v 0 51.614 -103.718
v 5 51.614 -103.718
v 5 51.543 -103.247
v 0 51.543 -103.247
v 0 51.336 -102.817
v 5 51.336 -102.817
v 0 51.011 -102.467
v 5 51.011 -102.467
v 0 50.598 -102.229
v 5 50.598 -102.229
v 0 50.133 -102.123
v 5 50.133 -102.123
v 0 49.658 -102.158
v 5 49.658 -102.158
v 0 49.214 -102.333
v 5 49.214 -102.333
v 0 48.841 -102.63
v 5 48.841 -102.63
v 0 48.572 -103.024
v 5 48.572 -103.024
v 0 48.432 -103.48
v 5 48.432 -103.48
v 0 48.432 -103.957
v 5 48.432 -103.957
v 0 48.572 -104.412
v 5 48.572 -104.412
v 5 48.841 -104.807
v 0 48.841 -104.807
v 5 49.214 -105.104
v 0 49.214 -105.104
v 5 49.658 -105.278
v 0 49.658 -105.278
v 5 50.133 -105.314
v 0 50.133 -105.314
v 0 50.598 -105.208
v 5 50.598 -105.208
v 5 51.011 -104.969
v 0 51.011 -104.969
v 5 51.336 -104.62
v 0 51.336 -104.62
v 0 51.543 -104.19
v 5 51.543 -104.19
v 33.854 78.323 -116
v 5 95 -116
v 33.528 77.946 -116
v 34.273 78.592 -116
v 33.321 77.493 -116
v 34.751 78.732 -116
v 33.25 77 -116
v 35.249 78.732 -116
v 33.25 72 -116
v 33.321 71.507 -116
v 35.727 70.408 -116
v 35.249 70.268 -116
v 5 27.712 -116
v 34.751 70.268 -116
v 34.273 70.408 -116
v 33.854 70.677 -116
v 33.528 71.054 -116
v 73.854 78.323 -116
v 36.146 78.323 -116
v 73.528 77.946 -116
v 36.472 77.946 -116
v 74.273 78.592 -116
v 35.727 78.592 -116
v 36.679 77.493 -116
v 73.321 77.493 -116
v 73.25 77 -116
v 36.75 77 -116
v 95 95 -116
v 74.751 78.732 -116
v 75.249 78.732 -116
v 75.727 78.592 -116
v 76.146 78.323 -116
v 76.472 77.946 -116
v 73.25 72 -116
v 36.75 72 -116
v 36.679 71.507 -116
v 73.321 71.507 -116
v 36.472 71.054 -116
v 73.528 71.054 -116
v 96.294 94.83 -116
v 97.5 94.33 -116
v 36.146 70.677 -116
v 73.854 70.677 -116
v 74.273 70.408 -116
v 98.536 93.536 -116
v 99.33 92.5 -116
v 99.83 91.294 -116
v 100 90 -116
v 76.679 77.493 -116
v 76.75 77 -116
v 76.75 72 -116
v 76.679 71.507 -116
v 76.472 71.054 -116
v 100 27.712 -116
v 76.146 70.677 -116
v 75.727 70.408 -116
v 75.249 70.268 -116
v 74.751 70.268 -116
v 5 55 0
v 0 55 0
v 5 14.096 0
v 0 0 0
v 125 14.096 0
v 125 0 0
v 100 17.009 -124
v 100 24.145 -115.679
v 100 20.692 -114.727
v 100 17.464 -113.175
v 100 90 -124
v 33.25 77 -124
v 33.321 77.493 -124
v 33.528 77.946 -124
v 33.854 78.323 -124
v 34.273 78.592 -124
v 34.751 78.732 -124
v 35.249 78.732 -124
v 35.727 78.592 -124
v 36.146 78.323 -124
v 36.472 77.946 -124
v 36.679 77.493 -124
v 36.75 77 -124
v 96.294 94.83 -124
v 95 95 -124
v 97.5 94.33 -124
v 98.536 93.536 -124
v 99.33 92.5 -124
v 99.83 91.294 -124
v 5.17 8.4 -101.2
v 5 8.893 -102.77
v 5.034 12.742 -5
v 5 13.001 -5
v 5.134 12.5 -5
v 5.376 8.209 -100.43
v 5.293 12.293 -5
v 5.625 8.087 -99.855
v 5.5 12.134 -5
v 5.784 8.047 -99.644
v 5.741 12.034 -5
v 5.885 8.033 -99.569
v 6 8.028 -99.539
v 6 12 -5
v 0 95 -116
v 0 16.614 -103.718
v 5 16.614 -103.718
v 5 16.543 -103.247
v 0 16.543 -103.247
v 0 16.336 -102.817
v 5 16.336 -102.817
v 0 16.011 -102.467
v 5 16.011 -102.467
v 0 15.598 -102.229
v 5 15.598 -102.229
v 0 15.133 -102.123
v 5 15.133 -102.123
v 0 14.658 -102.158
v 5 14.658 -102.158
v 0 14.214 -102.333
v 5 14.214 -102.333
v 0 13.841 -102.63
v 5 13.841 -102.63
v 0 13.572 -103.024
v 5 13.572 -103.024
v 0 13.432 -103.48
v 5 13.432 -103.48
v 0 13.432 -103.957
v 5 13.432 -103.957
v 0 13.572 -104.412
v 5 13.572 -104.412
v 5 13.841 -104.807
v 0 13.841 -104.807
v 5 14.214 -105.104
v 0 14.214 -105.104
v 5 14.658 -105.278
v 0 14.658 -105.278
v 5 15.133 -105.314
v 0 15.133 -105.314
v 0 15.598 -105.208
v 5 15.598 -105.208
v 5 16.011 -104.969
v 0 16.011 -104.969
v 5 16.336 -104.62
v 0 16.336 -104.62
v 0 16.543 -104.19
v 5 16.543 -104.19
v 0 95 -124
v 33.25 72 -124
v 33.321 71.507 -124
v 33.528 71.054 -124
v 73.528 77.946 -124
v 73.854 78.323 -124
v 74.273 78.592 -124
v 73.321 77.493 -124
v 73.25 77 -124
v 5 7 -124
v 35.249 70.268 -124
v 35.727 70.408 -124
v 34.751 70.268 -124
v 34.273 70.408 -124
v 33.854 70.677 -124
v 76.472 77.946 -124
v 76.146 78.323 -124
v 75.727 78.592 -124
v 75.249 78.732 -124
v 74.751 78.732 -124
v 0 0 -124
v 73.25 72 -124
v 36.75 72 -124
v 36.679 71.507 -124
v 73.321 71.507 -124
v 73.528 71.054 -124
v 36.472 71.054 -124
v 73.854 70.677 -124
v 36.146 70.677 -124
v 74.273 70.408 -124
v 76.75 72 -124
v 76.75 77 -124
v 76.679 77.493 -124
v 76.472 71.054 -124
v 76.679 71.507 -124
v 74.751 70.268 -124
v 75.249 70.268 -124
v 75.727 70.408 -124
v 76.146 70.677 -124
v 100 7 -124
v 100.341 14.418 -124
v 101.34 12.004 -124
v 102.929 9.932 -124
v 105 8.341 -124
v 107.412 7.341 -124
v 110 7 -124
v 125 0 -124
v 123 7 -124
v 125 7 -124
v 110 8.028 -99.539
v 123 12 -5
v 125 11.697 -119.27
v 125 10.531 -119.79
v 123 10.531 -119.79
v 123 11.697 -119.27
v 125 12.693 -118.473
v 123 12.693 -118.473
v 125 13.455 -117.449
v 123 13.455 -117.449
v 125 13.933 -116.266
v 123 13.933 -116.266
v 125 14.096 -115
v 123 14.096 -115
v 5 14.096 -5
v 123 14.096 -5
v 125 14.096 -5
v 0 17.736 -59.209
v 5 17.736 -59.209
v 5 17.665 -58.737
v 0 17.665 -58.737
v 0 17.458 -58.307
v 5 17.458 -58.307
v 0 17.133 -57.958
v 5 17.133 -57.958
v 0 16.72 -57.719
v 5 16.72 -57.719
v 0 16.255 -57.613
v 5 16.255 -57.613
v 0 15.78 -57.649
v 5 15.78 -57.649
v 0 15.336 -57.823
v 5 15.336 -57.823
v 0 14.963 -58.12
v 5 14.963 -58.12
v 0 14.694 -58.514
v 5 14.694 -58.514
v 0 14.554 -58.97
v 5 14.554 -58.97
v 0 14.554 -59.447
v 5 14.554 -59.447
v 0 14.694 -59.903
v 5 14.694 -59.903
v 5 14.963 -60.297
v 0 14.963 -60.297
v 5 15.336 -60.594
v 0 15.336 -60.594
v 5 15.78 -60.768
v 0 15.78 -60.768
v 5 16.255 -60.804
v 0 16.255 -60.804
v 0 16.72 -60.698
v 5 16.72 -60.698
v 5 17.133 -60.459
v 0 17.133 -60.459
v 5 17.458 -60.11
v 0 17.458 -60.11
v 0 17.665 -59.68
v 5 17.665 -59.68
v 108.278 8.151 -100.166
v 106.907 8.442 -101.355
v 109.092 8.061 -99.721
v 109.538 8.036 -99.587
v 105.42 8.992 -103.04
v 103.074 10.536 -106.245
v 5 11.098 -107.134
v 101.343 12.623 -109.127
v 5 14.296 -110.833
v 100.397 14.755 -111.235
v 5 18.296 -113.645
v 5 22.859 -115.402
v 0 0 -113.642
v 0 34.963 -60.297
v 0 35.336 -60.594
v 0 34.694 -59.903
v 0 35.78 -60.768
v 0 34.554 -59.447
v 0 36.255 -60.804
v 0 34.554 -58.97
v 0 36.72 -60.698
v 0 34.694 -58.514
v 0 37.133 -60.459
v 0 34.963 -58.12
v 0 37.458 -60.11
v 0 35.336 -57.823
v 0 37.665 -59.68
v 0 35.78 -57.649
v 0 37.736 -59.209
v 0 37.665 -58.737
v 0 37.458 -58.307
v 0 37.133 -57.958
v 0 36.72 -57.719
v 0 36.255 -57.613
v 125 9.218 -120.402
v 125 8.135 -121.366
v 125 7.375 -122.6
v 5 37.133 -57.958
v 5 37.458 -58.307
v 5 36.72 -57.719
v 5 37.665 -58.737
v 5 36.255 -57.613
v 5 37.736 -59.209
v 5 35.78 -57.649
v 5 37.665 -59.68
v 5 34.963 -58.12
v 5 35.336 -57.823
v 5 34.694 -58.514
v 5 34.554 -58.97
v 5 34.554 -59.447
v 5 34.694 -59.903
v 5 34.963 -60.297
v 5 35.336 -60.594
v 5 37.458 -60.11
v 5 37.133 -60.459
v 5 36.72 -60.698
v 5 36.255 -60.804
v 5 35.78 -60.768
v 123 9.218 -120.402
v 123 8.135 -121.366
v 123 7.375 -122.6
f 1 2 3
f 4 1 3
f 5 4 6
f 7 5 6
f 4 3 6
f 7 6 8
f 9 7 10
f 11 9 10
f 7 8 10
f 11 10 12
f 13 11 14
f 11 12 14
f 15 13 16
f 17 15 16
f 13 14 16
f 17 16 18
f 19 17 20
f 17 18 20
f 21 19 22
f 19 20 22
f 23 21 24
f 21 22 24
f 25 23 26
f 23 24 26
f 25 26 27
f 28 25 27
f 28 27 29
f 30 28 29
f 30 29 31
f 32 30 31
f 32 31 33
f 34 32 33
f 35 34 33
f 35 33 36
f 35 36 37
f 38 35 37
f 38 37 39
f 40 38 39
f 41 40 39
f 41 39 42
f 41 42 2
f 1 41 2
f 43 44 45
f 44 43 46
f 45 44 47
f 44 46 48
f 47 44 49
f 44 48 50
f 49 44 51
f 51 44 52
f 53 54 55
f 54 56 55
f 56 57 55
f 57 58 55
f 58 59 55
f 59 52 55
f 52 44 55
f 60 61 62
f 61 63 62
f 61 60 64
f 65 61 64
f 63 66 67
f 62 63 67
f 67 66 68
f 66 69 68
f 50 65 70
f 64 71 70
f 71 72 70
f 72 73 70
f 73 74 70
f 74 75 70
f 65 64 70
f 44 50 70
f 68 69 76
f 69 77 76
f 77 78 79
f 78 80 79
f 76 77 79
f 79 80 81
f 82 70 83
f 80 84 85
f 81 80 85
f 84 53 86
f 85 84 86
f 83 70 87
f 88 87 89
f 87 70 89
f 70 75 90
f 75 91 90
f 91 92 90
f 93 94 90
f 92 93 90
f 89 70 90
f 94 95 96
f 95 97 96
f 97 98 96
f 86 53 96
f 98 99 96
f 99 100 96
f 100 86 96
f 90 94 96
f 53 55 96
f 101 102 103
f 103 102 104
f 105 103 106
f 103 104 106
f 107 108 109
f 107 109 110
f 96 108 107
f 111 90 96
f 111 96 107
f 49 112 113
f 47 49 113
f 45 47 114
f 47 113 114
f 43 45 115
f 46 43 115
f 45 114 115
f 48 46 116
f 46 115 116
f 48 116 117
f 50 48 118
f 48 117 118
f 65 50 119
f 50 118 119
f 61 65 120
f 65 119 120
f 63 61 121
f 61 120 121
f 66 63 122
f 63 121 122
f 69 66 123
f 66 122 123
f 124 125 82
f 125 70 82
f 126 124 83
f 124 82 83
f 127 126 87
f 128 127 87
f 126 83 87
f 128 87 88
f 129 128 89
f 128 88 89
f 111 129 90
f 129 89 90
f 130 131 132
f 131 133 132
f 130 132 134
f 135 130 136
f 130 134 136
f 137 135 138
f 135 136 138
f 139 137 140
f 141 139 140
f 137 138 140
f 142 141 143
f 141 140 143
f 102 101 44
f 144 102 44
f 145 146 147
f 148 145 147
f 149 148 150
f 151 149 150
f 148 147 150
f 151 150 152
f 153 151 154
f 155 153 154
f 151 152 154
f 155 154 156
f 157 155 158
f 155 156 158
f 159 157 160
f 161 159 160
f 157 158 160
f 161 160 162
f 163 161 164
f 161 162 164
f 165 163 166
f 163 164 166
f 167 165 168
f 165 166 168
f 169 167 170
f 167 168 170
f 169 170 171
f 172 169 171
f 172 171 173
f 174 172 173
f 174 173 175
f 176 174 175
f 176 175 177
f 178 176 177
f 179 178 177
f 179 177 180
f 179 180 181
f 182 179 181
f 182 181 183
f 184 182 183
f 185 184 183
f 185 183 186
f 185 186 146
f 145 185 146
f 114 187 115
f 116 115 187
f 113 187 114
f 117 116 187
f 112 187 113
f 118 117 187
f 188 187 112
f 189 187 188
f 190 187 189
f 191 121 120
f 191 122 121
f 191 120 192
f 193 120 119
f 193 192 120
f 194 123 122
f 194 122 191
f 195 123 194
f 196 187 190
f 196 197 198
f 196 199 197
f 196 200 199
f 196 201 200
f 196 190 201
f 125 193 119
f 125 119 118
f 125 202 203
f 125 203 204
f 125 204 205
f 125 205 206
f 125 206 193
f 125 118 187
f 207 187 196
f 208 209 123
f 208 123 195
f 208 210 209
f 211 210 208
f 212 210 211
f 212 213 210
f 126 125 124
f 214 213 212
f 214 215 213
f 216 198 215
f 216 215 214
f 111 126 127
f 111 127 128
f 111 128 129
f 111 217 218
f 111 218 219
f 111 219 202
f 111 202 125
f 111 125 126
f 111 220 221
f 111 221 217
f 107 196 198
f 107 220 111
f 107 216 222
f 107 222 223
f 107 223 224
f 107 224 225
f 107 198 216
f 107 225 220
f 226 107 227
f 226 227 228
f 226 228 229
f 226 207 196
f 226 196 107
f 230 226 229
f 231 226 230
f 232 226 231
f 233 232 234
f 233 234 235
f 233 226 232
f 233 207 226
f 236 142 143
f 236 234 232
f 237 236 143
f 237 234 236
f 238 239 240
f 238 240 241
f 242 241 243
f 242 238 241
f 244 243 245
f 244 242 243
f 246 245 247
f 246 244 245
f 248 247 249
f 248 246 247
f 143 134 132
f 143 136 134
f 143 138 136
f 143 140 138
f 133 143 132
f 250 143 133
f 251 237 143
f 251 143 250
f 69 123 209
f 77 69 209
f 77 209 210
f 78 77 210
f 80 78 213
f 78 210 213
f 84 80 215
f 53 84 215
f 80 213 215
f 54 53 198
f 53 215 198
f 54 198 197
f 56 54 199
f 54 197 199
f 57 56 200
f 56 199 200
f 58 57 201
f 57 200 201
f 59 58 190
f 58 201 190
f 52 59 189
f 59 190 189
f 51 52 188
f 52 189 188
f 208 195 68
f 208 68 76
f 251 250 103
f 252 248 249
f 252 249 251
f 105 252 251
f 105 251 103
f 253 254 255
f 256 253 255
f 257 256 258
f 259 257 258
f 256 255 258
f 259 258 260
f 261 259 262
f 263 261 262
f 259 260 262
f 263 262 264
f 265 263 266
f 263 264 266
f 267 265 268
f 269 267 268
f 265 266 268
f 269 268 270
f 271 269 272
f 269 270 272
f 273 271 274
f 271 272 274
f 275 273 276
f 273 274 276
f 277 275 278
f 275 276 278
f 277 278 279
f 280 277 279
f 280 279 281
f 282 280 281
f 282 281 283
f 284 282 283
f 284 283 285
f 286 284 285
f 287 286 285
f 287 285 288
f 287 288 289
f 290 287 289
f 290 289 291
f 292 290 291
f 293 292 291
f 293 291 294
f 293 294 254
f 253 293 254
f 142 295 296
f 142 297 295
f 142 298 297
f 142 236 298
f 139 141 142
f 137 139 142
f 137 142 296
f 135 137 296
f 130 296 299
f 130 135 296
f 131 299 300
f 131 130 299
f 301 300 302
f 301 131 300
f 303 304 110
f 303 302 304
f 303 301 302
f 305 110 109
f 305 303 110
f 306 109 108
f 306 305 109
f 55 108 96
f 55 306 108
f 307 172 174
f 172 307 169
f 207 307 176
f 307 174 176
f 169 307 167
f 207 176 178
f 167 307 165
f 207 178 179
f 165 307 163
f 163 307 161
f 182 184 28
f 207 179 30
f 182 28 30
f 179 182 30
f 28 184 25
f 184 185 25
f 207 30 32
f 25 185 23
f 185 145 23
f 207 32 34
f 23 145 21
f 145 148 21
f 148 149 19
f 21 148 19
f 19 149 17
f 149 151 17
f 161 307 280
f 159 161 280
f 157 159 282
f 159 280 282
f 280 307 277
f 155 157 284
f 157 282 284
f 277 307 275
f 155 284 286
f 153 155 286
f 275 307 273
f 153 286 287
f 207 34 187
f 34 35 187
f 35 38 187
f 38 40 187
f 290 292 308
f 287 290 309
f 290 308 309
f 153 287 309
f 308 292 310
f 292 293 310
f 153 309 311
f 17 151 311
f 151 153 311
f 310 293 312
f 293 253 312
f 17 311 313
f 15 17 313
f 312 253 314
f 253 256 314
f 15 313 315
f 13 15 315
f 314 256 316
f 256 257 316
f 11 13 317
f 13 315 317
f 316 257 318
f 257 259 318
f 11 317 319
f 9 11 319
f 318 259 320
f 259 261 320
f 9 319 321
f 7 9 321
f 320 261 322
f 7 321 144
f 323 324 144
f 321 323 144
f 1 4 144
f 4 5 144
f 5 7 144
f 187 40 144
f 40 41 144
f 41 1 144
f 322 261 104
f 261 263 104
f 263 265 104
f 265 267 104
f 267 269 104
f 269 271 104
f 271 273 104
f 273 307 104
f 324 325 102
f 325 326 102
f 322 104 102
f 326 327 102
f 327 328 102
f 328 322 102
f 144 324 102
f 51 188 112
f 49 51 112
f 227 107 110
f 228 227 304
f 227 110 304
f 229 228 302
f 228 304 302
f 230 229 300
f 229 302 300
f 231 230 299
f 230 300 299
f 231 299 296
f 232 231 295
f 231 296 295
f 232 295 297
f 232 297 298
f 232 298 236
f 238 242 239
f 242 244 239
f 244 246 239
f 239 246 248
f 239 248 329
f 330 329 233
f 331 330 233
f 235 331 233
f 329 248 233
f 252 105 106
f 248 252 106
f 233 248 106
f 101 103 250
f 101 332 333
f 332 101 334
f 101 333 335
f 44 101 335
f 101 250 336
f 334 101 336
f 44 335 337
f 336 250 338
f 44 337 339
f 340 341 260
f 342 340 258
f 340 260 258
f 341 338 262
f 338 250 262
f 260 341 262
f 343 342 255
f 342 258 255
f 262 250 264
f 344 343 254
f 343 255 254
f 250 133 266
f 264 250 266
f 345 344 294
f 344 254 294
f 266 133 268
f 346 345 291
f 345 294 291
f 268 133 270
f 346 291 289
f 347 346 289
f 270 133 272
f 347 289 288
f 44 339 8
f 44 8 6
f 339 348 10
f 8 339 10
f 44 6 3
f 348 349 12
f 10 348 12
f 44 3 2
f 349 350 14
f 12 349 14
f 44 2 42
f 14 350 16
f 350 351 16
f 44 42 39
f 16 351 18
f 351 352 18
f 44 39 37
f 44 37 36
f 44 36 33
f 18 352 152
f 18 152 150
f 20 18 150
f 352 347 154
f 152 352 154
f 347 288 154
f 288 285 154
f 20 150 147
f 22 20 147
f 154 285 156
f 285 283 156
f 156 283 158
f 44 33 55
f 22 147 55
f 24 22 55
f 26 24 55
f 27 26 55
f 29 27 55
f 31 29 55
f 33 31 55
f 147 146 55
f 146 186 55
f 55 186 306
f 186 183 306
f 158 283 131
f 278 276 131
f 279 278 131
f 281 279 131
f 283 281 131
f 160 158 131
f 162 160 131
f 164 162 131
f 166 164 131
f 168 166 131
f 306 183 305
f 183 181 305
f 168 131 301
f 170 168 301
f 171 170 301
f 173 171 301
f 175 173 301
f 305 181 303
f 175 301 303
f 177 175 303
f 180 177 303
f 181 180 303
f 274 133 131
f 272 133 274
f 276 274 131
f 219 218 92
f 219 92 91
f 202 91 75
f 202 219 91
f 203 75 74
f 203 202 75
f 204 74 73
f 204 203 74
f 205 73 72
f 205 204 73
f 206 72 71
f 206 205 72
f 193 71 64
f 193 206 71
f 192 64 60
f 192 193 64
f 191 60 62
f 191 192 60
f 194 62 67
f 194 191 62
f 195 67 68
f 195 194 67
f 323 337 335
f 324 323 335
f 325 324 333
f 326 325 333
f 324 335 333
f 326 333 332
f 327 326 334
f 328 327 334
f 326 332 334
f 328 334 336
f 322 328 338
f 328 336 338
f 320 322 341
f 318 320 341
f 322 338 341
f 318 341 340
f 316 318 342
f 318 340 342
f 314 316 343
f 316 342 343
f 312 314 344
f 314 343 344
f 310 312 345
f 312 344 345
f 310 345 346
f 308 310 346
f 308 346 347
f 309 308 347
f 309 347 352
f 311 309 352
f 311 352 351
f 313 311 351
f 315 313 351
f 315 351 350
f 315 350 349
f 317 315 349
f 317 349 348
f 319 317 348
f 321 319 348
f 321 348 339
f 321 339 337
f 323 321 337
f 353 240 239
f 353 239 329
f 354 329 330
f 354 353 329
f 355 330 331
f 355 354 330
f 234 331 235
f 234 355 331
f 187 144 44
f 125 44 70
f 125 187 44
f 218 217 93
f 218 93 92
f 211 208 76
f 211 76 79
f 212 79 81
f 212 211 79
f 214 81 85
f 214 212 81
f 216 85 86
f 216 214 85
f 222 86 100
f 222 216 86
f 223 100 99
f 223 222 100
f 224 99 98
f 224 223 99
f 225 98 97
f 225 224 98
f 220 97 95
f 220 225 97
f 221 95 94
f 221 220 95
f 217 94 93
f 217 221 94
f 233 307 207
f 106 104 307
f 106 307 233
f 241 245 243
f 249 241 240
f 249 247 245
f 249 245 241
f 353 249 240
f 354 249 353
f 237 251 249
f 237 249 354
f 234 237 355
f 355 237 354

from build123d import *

# Parameters (mm, degrees)
SKETCH1_W            = 155
SKETCH1_H            = 5
BOSS_EXTRUDE2_DEPTH  = 55
SKETCH2_W            = 112
SKETCH2_H            = 45
SKETCH2_R            = 1.75
CUT_EXTRUDE1_DEPTH   = 55
SKETCH3_W            = 100
SKETCH3_H            = 20
CUT_EXTRUDE2_DEPTH   = 55
SKETCH4_W            = 40
SKETCH4_H            = 8.065867699
CUT_EXTRUDE3_DEPTH   = 55
BOSS_EXTRUDE4_DEPTH  = 5
CUT_EXTRUDE4_DEPTH   = 50
SKETCH9_W            = 4.377781836
SKETCH9_H            = 86.488706471
BOSS_EXTRUDE7_DEPTH  = 50
SKETCH10_W           = 20
SKETCH10_H           = 86.532324722
CUT_EXTRUDE5_DEPTH   = 10
SKETCH12_R           = 9.5
SKETCH12_R_2         = 6
CUT_EXTRUDE6_DEPTH   = 10
CUT_EXTRUDE7_START   = 50
SKETCH13_R           = 9.5
SKETCH13_R_2         = 6
CUT_EXTRUDE7_DEPTH   = 50
CUT_EXTRUDE8_DEPTH   = 50
CUT_EXTRUDE9_DEPTH   = 50
CUT_EXTRUDE10_DEPTH  = 10
FILLET5_R            = 3
SKETCH18_W           = 98.767816147
SKETCH18_H           = 10.604205858
BOSS_EXTRUDE8_DEPTH  = 5
CUT_EXTRUDE11_DEPTH  = 5
SKETCH20_W           = 155
SKETCH20_H           = 119
BOSS_EXTRUDE9_DEPTH  = 10
CUT_EXTRUDE13_DEPTH  = 155
SKETCH24_W           = 125
SKETCH24_H           = 8
BOSS_EXTRUDE10_DEPTH = 95
FILLET6_R            = 20
SKETCH26_W           = 16
SKETCH26_H           = 1.5
BOSS_EXTRUDE11_DEPTH = 12
BOSS_EXTRUDE12_DEPTH = 15
SKETCH28_R           = 2.5
CUT_EXTRUDE15_DEPTH  = 5
CUT_EXTRUDE17_DEPTH  = 35
SKETCH29_W           = 43
SKETCH29_H           = 43
CUT_EXTRUDE18_DEPTH  = 35
FILLET9_R            = 10
SKETCH31_W           = 124
SKETCH31_H           = 12
BOSS_EXTRUDE14_DEPTH = 2
SKETCH32_W           = 5
SKETCH32_H           = 2
BOSS_EXTRUDE15_DEPTH = 132
SKETCH33_W           = 20
SKETCH33_H           = 12
CUT_EXTRUDE19_DEPTH  = 160
SKETCH34_W           = 2
SKETCH34_H           = 12
BOSS_EXTRUDE17_DEPTH = 123
SKETCH36_R           = 6
CUT_EXTRUDE20_DEPTH  = 40
CUT_EXTRUDE21_DEPTH  = 25
SKETCH39_W           = 10
SKETCH39_H           = 12
CUT_EXTRUDE22_DEPTH  = 165
SKETCH40_W           = 2
SKETCH40_H           = 12
BOSS_EXTRUDE18_DEPTH = 115
SKETCH41_W           = 5
SKETCH41_H           = 64.538049938
BOSS_EXTRUDE19_DEPTH = 5
BOSS_EXTRUDE20_REACH = 223.912
SKETCH42_W           = 10
SKETCH42_H           = 124
SKETCH45_R           = 1.6
CUT_EXTRUDE23_DEPTH  = 30
SKETCH46_W           = 157.555653428
SKETCH46_H           = 97.617109351
CUT_EXTRUDE24_DEPTH  = 160
BOSS_EXTRUDE22_DEPTH = 120
SKETCH52_W           = 2
SKETCH52_H           = 14.095569493
BOSS_EXTRUDE23_DEPTH = 120
FILLET14_R           = 10
FILLET15_R           = 5
FILLET16_R           = 5
FILLET17_R           = 5
FILLET18_R           = 1
CUT_EXTRUDE27_DEPTH  = 30


with BuildPart() as part:
    # Sketch1 → Boss-Extrude2 (new body)
    with BuildSketch(Plane(origin=(0, 0, 0), x_dir=(1, 0, 0), z_dir=(0, 1, 0))):
        Polygon((-44.578450817, 29.59757322), (-48.782107146, 26.890310125), (-130, 153), (-125.796343671, 155.707263095), align=None)
        with BuildLine():
            ThreePointArc((0, 0), (-27.802696096, 7.256044178), (-48.782107146, 26.890310125))
            Line((-48.782107146, 26.890310125), (-44.578450817, 29.59757322))
            Line((-44.578450817, 29.59757322), (0, 5))
            Line((0, 5), (0, 0))
        make_face()
        with Locations((77.5, 2.5)):
            Rectangle(SKETCH1_W, SKETCH1_H)
    extrude(amount=BOSS_EXTRUDE2_DEPTH)

    # Sketch2 → Cut-Extrude1 (cut)
    with BuildSketch(Plane.XY):
        with Locations((99, 32.5)):
            Rectangle(SKETCH2_W, SKETCH2_H)
        with Locations((5, 25)):
            Circle(SKETCH2_R)
        with Locations((5, 50)):
            Circle(SKETCH2_R)
        with Locations((35, 50)):
            Circle(SKETCH2_R)
        with Locations((35, 25)):
            Circle(SKETCH2_R)
    extrude(amount=-CUT_EXTRUDE1_DEPTH, mode=Mode.SUBTRACT)

    # Sketch3 → Cut-Extrude2 (cut)
    with BuildSketch(Plane(origin=(-22.239707671, 0, 14.322945338), x_dir=(0.5414526190246729, 0, 0.840731265834287), z_dir=(-0.8407312658342869, 0, 0.5414526190246728))):
        with Locations((-99.020724146, 15)):
            Rectangle(SKETCH3_W, SKETCH3_H)
    extrude(amount=-CUT_EXTRUDE2_DEPTH, mode=Mode.SUBTRACT)

    # Sketch4 → Cut-Extrude3 (cut)
    with BuildSketch(Plane(origin=(2.114976352, 0, -3.832994761), x_dir=(-0.8755563671808256, 0, -0.48311597767939257), z_dir=(0.48311597767939257, 0, -0.8755563671808256))):
        with Locations((28.330006975, 9.03293385)):
            Rectangle(SKETCH4_W, SKETCH4_H)
    extrude(amount=-CUT_EXTRUDE3_DEPTH, mode=Mode.SUBTRACT)

    # Sketch5 → Boss-Extrude4 (add)
    with BuildSketch(Plane.XZ):
        Polygon((0, -5), (-44.578450817, -29.59757322), (-125.796343671, -155.707263095), (0, -155.707263095), align=None)
    extrude(amount=-BOSS_EXTRUDE4_DEPTH)

    # Sketch8 → Cut-Extrude4 (cut)
    with BuildSketch(Plane(origin=(0, 5, 0), x_dir=(1, 0, 0), z_dir=(0, 1, 0))):
        Polygon((-44.578450817, 29.59757322), (-98.72371272, 113.670699803), (-44.578450817, 113.670699803), align=None)
    extrude(amount=-CUT_EXTRUDE4_DEPTH, mode=Mode.SUBTRACT)

    # Sketch9 → Boss-Extrude7 (add)
    with BuildSketch(Plane(origin=(0, 5, 0), x_dir=(1, 0, 0), z_dir=(0, 1, 0))):
        with Locations((-42.389559899, 70.426346568)):
            Rectangle(SKETCH9_W, SKETCH9_H)
    extrude(amount=BOSS_EXTRUDE7_DEPTH)

    # Sketch10 → Cut-Extrude5 (cut)
    with BuildSketch(Plane(origin=(0, 5, 0), x_dir=(1, 0, 0), z_dir=(0, 1, 0))):
        with Locations((-30.200668981, 70.404537442)):
            Rectangle(SKETCH10_W, SKETCH10_H)
    extrude(amount=-CUT_EXTRUDE5_DEPTH, mode=Mode.SUBTRACT)

    # Sketch12 → Cut-Extrude6 (cut)
    with BuildSketch(Plane(origin=(-40.200668981, 0, 0), x_dir=(0, 0, -1), z_dir=(1, 0, 0))):
        with Locations(Location((57.181993332, 10, 0), (0, 0, 90))):
            Circle(SKETCH12_R)
        with Locations(Location((77.181993332, 10, 0), (0, 0, 90))):
            Circle(SKETCH12_R_2)
    extrude(amount=-CUT_EXTRUDE6_DEPTH, mode=Mode.SUBTRACT)

    # Sketch13 → Cut-Extrude7 (cut)
    with BuildSketch(Plane(origin=(-40.200668981, 0, 0), x_dir=(0, 0, -1), z_dir=(1, 0, 0)).offset(CUT_EXTRUDE7_START)):
        with Locations(Location((57.181993332, 10, 0), (0, 0, 90))):
            Circle(SKETCH13_R)
        with Locations(Location((77.181993332, 10, 0), (0, 0, 90))):
            Circle(SKETCH13_R_2)
    extrude(amount=-CUT_EXTRUDE7_DEPTH, mode=Mode.SUBTRACT)

    # Sketch14 → Cut-Extrude8 (cut)
    with BuildSketch(Plane(origin=(0, 5, 0), x_dir=(1, 0, 0), z_dir=(0, 1, 0))):
        Polygon((0, 103.038090201), (-91.876037903, 103.038090201), (-126.106254173, 155.707263095), (0, 155.707263095), align=None)
    extrude(amount=-CUT_EXTRUDE8_DEPTH, mode=Mode.SUBTRACT)

    # Sketch15 → Cut-Extrude9 (cut)
    with BuildSketch(Plane(origin=(-22.239707671, 0, 14.322945338), x_dir=(0.5414526190246729, 0, 0.840731265834287), z_dir=(-0.8407312658342869, 0, 0.5414526190246728))):
        Polygon((-176.035909688, 0), (-199.020724146, 18.247450711), (-199.020724146, 0), align=None)
    extrude(amount=-CUT_EXTRUDE9_DEPTH, mode=Mode.SUBTRACT)

    # Sketch16 → Cut-Extrude10 (cut)
    with BuildSketch(Plane(origin=(-40.200668981, 0, 0), x_dir=(0, 0, -1), z_dir=(1, 0, 0))):
        Polygon((113.670699803, 15.495236251), (48.252901996, 55), (113.670699803, 55), align=None)
    extrude(amount=-CUT_EXTRUDE10_DEPTH, mode=Mode.SUBTRACT)

    # Fillet5
    fillet5_edges = [part.edges().sort_by_distance(p)[0] for p in [
        (-100.847592598, 5, -112.302866383),
        (-46.680278982, 25, -28.243941672),
        (-46.680278982, 5, -28.243941672),
        (-100.825540884, 25, -112.317068256),
    ]]
    fillet(fillet5_edges, radius=FILLET5_R)

    # Sketch18 → Boss-Extrude8 (add)
    with BuildSketch(Plane(origin=(0, 5, 0), x_dir=(1, 0, 0), z_dir=(0, 1, 0))):
        with Locations((-49.383908074, 108.34019313)):
            Rectangle(SKETCH18_W, SKETCH18_H)
    extrude(amount=-BOSS_EXTRUDE8_DEPTH)

    # Sketch19 → Cut-Extrude11 (cut)
    with BuildSketch(Plane.XZ):
        Polygon((-97.82324149, -103.038090201), (-98.767816147, -104.504762295), (-98.767816147, -103.038090201), align=None)
    extrude(amount=-CUT_EXTRUDE11_DEPTH, mode=Mode.SUBTRACT)

    # Sketch20 → Boss-Extrude9 (add)
    with BuildSketch(Plane.XZ):
        with Locations((77.5, -64.5)):
            Rectangle(SKETCH20_W, SKETCH20_H)
    extrude(amount=-BOSS_EXTRUDE9_DEPTH)

    # Sketch21 → Cut-Extrude13 (cut)
    with BuildSketch(Plane(origin=(155, 0, 0), x_dir=(0, 0, -1), z_dir=(1, 0, 0))):
        Polygon((5, 10), (124, 10), (124, 7), align=None)
    extrude(amount=-CUT_EXTRUDE13_DEPTH, mode=Mode.SUBTRACT)

    # Sketch24 → Boss-Extrude10 (add)
    with BuildSketch(Plane.XZ):
        with Locations((62.5, -120)):
            Rectangle(SKETCH24_W, SKETCH24_H)
    extrude(amount=-BOSS_EXTRUDE10_DEPTH)

    # Fillet6
    fillet6_edges = [part.edges().sort_by_distance(p)[0] for p in [
        (62.5, 7.201680672, -116),
    ]]
    fillet(fillet6_edges, radius=FILLET6_R)

    # Sketch26 → Boss-Extrude11 (add)
    with BuildSketch(Plane(origin=(2.114976352, 0, -3.832994761), x_dir=(-0.8755563671808256, 0, -0.48311597767939257), z_dir=(0.48311597767939257, 0, -0.8755563671808256))):
        with Locations((28.330006975, 13.815867699)):
            Rectangle(SKETCH26_W, SKETCH26_H)
    extrude(amount=BOSS_EXTRUDE11_DEPTH)

    # Sketch27 → Boss-Extrude12 (add)
    with BuildSketch(Plane(origin=(0, 14.565867699, 0), x_dir=(1, 0, 0), z_dir=(0, 1, 0))):
        Polygon((-15.6850907, 13.654745957), (-9.887698968, 24.161422363), (-23.896600843, 31.891278006), (-29.693992575, 21.384601599), (-28.030435477, 20.466681242), (-23.150964103, 29.30980055), (-12.469176423, 23.415785623), (-17.348647798, 14.572666314), align=None)
    extrude(amount=BOSS_EXTRUDE12_DEPTH)

    # Sketch28 → Cut-Extrude15 (cut)
    with BuildSketch(Plane(origin=(0, 14.565867699, 0), x_dir=(1, 0, 0), z_dir=(0, 1, 0))):
        with Locations(Location((-20.24980595, 21.941233432, 0), (0, 0, 180))):
            Circle(SKETCH28_R)
    extrude(amount=-CUT_EXTRUDE15_DEPTH, mode=Mode.SUBTRACT)

    # Sketch25 → Cut-Extrude17 (cut)
    with BuildSketch(Plane(origin=(0, 0, -124), x_dir=(-1, 0, 0), z_dir=(0, 0, -1))):
        with BuildLine():
            Line((-36.75, 77), (-36.75, 72))
            ThreePointArc((-36.75, 72), (-35, 70.25), (-33.25, 72))
            Line((-33.25, 72), (-33.25, 77))
            ThreePointArc((-33.25, 77), (-35, 78.75), (-36.75, 77))
        make_face()
        with BuildLine():
            Line((-73.25, 77), (-73.25, 72))
            ThreePointArc((-73.25, 72), (-75, 70.25), (-76.75, 72))
            Line((-76.75, 72), (-76.75, 77))
            ThreePointArc((-76.75, 77), (-75, 78.75), (-73.25, 77))
        make_face()
    extrude(amount=-CUT_EXTRUDE17_DEPTH, mode=Mode.SUBTRACT)

    # Sketch29 → Cut-Extrude18 (cut)
    with BuildSketch(Plane.XY):
        with Locations((21.5, 33.5)):
            Rectangle(SKETCH29_W, SKETCH29_H)
    extrude(amount=-CUT_EXTRUDE18_DEPTH, mode=Mode.SUBTRACT)

    # Fillet9
    fillet9_edges = [part.edges().sort_by_distance(p)[0] for p in [
        (-115.522140631, 0, -134.985040643),
        (-127.898171835, 18.247450711, -154.353631548),
        (-42.389559899, 15.495236251, -113.670699803),
        (-42.389559899, 55, -48.252901996),
        (-127.898171835, 55, -154.353631548),
    ]]
    fillet(fillet9_edges, radius=FILLET9_R)

    # Sketch31 → Boss-Extrude14 (add)
    with BuildSketch(Plane(origin=(155, 0, 0), x_dir=(0, 0, -1), z_dir=(1, 0, 0))):
        with Locations((62, 6)):
            Rectangle(SKETCH31_W, SKETCH31_H)
    extrude(amount=-BOSS_EXTRUDE14_DEPTH)

    # Sketch32 → Boss-Extrude15 (add)
    with BuildSketch(Plane.ZY.offset(-153)):
        with Locations((-2.5, 11)):
            Rectangle(SKETCH32_W, SKETCH32_H)
    extrude(amount=BOSS_EXTRUDE15_DEPTH)

    # Sketch33 → Cut-Extrude19 (cut)
    with BuildSketch(Plane.XY):
        with Locations((145, 6)):
            Rectangle(SKETCH33_W, SKETCH33_H)
    extrude(amount=-CUT_EXTRUDE19_DEPTH, mode=Mode.SUBTRACT)

    # Sketch34 → Boss-Extrude17 (add)
    with BuildSketch(Plane.XY):
        with Locations((134, 6)):
            Rectangle(SKETCH34_W, SKETCH34_H)
    extrude(amount=-BOSS_EXTRUDE17_DEPTH)

    # Sketch36 → Cut-Extrude20 (cut, symmetric)
    with BuildSketch(Plane(origin=(-40.200668981, 0, 0), x_dir=(0, 0, -1), z_dir=(1, 0, 0))):
        with Locations(Location((90.194878088, 10, 0), (0, 0, 90))):
            Circle(SKETCH36_R)
    extrude(amount=CUT_EXTRUDE20_DEPTH, both=True, mode=Mode.SUBTRACT)

    # Sketch38 → Cut-Extrude21 (cut)
    with BuildSketch(Plane(origin=(125, 0, 0), x_dir=(0, 0, -1), z_dir=(1, 0, 0))):
        Polygon((95.495958465, 7.718589282), (124, 7), (124, 95), (116, 95), align=None)
    extrude(amount=-CUT_EXTRUDE21_DEPTH, mode=Mode.SUBTRACT)

    # Sketch39 → Cut-Extrude22 (cut)
    with BuildSketch(Plane.XY):
        with Locations((130, 6)):
            Rectangle(SKETCH39_W, SKETCH39_H)
    extrude(amount=-CUT_EXTRUDE22_DEPTH, mode=Mode.SUBTRACT)

    # Sketch40 → Boss-Extrude18 (add)
    with BuildSketch(Plane.XY):
        with Locations((124, 6)):
            Rectangle(SKETCH40_W, SKETCH40_H)
    extrude(amount=-BOSS_EXTRUDE18_DEPTH)

    # Sketch41 → Boss-Extrude19 (add)
    with BuildSketch(Plane(origin=(0, 5, 0), x_dir=(1, 0, 0), z_dir=(0, 1, 0))):
        with Locations((-2.5, 81.37327109)):
            Rectangle(SKETCH41_W, SKETCH41_H)
    extrude(amount=-BOSS_EXTRUDE19_DEPTH)

    # Boss-Extrude20: up to this face of the body (flat: up to its plane)
    boss_extrude20_end = Plane(part.part.faces().sort_by_distance((50, 95, -120))[0])
    # Sketch42 → Boss-Extrude20 (add, up to the picked face)
    with BuildSketch(Plane(origin=(0, 5, 0), x_dir=(1, 0, 0), z_dir=(0, 1, 0)), mode=Mode.PRIVATE) as boss_extrude20_sk1:
        with Locations((0, 62)):
            Rectangle(SKETCH42_W, SKETCH42_H)
    boss_extrude20_tool1 = split(extrude(boss_extrude20_sk1.sketch, amount=BOSS_EXTRUDE20_REACH, mode=Mode.PRIVATE), bisect_by=boss_extrude20_end, keep=Keep.BOTH, mode=Mode.PRIVATE)
    add(boss_extrude20_tool1.solids().sort_by(Axis((0, 5, -62), (0, 1, 0)))[0])

    # Sketch45 → Cut-Extrude23 (cut)
    with BuildSketch(Plane(origin=(5, 0, 0), x_dir=(0, 0, -1), z_dir=(1, 0, 0))):
        with Locations(Location((59.208509529, 36.135781847, 0), (0, 0, 90))):
            Circle(SKETCH45_R)
        with Locations(Location((59.208509529, 16.135781847, 0), (0, 0, 90))):
            Circle(SKETCH45_R)
        with Locations(Location((103.718271361, 50.013687011, 0), (0, 0, 90))):
            Circle(SKETCH45_R)
        with Locations(Location((103.718271361, 15.013687011, 0), (0, 0, 90))):
            Circle(SKETCH45_R)
    extrude(amount=-CUT_EXTRUDE23_DEPTH, mode=Mode.SUBTRACT)

    # Sketch46 → Cut-Extrude24 (cut)
    with BuildSketch(Plane.XY):
        with Locations((-78.777826714, 48.808554676)):
            Rectangle(SKETCH46_W, SKETCH46_H)
    extrude(amount=-CUT_EXTRUDE24_DEPTH, mode=Mode.SUBTRACT)

    # Sketch51 → Boss-Extrude22 (add)
    with BuildSketch(Plane(origin=(125, 0, 0), x_dir=(0, 0, -1), z_dir=(1, 0, 0))):
        Polygon((124, 7), (5, 12), (5, 14.095569493), (0, 14.095569493), (0, 7.113445378), align=None)
    extrude(amount=-BOSS_EXTRUDE22_DEPTH)

    # Sketch52 → Boss-Extrude23 (add)
    with BuildSketch(Plane.XY):
        with Locations((124, 7.047784747)):
            Rectangle(SKETCH52_W, SKETCH52_H)
    extrude(amount=-BOSS_EXTRUDE23_DEPTH)

    # Fillet14
    fillet14_edges = [part.edges().sort_by_distance(p)[0] for p in [
        (100, 7.513892889, -111.769349239),
    ]]
    fillet(fillet14_edges, radius=FILLET14_R)

    # Fillet15
    fillet15_edges = [part.edges().sort_by_distance(p)[0] for p in [
        (124, 14.095569493, -120),
    ]]
    fillet(fillet15_edges, radius=FILLET15_R)

    # Fillet16
    # the kernel refuses this fillet: 5 mm, written as the material it adds along each edge
    with BuildSketch(Plane(origin=(123, 7.168067227, -120), x_dir=(0, 0.9980473315851939, 0.062462179882501946), z_dir=(1, 0, 0))) as fillet16_piece_1:
        with BuildLine():
            CenterArc((4.502899102, -4.869840665), FILLET16_R, 103.101980319, 66.66628485)
            Line((-0.417587767, -3.981691481), (-0.909636454, -3.892876563))
            ThreePointArc((-0.909636454, -3.892876563), (-0.706066567, -1.938693285), (-0.497272683, 0.052152456))
            Line((-0.497272683, 0.052152456), (0.03123109, 0.499023666))
            ThreePointArc((0.03123109, 0.499023666), (1.954969583, 0.378627673), (3.256131762, 0.486984066))
            Line((3.256131762, 0.486984066), (3.369474248, 0))
        make_face()
    extrude(amount=2)

    # Fillet17
    fillet17_edges = [part.edges().sort_by_distance(p)[0] for p in [
        (100, 95, -120),
    ]]
    fillet(fillet17_edges, radius=FILLET17_R)

    # Fillet18
    fillet18_edges = [part.edges().sort_by_distance(p)[0] for p in [
        (5, 10.013892889, -52.269349239),
    ]]
    fillet(fillet18_edges, radius=FILLET18_R)

    # Sketch54 → Cut-Extrude27 (cut)
    with BuildSketch(Plane(origin=(5, 0, 0), x_dir=(0, 0, -1), z_dir=(1, 0, 0))):
        Polygon((0, 55), (116, 95), (0, 95), align=None)
    extrude(amount=-CUT_EXTRUDE27_DEPTH, mode=Mode.SUBTRACT)


solid = part.part
